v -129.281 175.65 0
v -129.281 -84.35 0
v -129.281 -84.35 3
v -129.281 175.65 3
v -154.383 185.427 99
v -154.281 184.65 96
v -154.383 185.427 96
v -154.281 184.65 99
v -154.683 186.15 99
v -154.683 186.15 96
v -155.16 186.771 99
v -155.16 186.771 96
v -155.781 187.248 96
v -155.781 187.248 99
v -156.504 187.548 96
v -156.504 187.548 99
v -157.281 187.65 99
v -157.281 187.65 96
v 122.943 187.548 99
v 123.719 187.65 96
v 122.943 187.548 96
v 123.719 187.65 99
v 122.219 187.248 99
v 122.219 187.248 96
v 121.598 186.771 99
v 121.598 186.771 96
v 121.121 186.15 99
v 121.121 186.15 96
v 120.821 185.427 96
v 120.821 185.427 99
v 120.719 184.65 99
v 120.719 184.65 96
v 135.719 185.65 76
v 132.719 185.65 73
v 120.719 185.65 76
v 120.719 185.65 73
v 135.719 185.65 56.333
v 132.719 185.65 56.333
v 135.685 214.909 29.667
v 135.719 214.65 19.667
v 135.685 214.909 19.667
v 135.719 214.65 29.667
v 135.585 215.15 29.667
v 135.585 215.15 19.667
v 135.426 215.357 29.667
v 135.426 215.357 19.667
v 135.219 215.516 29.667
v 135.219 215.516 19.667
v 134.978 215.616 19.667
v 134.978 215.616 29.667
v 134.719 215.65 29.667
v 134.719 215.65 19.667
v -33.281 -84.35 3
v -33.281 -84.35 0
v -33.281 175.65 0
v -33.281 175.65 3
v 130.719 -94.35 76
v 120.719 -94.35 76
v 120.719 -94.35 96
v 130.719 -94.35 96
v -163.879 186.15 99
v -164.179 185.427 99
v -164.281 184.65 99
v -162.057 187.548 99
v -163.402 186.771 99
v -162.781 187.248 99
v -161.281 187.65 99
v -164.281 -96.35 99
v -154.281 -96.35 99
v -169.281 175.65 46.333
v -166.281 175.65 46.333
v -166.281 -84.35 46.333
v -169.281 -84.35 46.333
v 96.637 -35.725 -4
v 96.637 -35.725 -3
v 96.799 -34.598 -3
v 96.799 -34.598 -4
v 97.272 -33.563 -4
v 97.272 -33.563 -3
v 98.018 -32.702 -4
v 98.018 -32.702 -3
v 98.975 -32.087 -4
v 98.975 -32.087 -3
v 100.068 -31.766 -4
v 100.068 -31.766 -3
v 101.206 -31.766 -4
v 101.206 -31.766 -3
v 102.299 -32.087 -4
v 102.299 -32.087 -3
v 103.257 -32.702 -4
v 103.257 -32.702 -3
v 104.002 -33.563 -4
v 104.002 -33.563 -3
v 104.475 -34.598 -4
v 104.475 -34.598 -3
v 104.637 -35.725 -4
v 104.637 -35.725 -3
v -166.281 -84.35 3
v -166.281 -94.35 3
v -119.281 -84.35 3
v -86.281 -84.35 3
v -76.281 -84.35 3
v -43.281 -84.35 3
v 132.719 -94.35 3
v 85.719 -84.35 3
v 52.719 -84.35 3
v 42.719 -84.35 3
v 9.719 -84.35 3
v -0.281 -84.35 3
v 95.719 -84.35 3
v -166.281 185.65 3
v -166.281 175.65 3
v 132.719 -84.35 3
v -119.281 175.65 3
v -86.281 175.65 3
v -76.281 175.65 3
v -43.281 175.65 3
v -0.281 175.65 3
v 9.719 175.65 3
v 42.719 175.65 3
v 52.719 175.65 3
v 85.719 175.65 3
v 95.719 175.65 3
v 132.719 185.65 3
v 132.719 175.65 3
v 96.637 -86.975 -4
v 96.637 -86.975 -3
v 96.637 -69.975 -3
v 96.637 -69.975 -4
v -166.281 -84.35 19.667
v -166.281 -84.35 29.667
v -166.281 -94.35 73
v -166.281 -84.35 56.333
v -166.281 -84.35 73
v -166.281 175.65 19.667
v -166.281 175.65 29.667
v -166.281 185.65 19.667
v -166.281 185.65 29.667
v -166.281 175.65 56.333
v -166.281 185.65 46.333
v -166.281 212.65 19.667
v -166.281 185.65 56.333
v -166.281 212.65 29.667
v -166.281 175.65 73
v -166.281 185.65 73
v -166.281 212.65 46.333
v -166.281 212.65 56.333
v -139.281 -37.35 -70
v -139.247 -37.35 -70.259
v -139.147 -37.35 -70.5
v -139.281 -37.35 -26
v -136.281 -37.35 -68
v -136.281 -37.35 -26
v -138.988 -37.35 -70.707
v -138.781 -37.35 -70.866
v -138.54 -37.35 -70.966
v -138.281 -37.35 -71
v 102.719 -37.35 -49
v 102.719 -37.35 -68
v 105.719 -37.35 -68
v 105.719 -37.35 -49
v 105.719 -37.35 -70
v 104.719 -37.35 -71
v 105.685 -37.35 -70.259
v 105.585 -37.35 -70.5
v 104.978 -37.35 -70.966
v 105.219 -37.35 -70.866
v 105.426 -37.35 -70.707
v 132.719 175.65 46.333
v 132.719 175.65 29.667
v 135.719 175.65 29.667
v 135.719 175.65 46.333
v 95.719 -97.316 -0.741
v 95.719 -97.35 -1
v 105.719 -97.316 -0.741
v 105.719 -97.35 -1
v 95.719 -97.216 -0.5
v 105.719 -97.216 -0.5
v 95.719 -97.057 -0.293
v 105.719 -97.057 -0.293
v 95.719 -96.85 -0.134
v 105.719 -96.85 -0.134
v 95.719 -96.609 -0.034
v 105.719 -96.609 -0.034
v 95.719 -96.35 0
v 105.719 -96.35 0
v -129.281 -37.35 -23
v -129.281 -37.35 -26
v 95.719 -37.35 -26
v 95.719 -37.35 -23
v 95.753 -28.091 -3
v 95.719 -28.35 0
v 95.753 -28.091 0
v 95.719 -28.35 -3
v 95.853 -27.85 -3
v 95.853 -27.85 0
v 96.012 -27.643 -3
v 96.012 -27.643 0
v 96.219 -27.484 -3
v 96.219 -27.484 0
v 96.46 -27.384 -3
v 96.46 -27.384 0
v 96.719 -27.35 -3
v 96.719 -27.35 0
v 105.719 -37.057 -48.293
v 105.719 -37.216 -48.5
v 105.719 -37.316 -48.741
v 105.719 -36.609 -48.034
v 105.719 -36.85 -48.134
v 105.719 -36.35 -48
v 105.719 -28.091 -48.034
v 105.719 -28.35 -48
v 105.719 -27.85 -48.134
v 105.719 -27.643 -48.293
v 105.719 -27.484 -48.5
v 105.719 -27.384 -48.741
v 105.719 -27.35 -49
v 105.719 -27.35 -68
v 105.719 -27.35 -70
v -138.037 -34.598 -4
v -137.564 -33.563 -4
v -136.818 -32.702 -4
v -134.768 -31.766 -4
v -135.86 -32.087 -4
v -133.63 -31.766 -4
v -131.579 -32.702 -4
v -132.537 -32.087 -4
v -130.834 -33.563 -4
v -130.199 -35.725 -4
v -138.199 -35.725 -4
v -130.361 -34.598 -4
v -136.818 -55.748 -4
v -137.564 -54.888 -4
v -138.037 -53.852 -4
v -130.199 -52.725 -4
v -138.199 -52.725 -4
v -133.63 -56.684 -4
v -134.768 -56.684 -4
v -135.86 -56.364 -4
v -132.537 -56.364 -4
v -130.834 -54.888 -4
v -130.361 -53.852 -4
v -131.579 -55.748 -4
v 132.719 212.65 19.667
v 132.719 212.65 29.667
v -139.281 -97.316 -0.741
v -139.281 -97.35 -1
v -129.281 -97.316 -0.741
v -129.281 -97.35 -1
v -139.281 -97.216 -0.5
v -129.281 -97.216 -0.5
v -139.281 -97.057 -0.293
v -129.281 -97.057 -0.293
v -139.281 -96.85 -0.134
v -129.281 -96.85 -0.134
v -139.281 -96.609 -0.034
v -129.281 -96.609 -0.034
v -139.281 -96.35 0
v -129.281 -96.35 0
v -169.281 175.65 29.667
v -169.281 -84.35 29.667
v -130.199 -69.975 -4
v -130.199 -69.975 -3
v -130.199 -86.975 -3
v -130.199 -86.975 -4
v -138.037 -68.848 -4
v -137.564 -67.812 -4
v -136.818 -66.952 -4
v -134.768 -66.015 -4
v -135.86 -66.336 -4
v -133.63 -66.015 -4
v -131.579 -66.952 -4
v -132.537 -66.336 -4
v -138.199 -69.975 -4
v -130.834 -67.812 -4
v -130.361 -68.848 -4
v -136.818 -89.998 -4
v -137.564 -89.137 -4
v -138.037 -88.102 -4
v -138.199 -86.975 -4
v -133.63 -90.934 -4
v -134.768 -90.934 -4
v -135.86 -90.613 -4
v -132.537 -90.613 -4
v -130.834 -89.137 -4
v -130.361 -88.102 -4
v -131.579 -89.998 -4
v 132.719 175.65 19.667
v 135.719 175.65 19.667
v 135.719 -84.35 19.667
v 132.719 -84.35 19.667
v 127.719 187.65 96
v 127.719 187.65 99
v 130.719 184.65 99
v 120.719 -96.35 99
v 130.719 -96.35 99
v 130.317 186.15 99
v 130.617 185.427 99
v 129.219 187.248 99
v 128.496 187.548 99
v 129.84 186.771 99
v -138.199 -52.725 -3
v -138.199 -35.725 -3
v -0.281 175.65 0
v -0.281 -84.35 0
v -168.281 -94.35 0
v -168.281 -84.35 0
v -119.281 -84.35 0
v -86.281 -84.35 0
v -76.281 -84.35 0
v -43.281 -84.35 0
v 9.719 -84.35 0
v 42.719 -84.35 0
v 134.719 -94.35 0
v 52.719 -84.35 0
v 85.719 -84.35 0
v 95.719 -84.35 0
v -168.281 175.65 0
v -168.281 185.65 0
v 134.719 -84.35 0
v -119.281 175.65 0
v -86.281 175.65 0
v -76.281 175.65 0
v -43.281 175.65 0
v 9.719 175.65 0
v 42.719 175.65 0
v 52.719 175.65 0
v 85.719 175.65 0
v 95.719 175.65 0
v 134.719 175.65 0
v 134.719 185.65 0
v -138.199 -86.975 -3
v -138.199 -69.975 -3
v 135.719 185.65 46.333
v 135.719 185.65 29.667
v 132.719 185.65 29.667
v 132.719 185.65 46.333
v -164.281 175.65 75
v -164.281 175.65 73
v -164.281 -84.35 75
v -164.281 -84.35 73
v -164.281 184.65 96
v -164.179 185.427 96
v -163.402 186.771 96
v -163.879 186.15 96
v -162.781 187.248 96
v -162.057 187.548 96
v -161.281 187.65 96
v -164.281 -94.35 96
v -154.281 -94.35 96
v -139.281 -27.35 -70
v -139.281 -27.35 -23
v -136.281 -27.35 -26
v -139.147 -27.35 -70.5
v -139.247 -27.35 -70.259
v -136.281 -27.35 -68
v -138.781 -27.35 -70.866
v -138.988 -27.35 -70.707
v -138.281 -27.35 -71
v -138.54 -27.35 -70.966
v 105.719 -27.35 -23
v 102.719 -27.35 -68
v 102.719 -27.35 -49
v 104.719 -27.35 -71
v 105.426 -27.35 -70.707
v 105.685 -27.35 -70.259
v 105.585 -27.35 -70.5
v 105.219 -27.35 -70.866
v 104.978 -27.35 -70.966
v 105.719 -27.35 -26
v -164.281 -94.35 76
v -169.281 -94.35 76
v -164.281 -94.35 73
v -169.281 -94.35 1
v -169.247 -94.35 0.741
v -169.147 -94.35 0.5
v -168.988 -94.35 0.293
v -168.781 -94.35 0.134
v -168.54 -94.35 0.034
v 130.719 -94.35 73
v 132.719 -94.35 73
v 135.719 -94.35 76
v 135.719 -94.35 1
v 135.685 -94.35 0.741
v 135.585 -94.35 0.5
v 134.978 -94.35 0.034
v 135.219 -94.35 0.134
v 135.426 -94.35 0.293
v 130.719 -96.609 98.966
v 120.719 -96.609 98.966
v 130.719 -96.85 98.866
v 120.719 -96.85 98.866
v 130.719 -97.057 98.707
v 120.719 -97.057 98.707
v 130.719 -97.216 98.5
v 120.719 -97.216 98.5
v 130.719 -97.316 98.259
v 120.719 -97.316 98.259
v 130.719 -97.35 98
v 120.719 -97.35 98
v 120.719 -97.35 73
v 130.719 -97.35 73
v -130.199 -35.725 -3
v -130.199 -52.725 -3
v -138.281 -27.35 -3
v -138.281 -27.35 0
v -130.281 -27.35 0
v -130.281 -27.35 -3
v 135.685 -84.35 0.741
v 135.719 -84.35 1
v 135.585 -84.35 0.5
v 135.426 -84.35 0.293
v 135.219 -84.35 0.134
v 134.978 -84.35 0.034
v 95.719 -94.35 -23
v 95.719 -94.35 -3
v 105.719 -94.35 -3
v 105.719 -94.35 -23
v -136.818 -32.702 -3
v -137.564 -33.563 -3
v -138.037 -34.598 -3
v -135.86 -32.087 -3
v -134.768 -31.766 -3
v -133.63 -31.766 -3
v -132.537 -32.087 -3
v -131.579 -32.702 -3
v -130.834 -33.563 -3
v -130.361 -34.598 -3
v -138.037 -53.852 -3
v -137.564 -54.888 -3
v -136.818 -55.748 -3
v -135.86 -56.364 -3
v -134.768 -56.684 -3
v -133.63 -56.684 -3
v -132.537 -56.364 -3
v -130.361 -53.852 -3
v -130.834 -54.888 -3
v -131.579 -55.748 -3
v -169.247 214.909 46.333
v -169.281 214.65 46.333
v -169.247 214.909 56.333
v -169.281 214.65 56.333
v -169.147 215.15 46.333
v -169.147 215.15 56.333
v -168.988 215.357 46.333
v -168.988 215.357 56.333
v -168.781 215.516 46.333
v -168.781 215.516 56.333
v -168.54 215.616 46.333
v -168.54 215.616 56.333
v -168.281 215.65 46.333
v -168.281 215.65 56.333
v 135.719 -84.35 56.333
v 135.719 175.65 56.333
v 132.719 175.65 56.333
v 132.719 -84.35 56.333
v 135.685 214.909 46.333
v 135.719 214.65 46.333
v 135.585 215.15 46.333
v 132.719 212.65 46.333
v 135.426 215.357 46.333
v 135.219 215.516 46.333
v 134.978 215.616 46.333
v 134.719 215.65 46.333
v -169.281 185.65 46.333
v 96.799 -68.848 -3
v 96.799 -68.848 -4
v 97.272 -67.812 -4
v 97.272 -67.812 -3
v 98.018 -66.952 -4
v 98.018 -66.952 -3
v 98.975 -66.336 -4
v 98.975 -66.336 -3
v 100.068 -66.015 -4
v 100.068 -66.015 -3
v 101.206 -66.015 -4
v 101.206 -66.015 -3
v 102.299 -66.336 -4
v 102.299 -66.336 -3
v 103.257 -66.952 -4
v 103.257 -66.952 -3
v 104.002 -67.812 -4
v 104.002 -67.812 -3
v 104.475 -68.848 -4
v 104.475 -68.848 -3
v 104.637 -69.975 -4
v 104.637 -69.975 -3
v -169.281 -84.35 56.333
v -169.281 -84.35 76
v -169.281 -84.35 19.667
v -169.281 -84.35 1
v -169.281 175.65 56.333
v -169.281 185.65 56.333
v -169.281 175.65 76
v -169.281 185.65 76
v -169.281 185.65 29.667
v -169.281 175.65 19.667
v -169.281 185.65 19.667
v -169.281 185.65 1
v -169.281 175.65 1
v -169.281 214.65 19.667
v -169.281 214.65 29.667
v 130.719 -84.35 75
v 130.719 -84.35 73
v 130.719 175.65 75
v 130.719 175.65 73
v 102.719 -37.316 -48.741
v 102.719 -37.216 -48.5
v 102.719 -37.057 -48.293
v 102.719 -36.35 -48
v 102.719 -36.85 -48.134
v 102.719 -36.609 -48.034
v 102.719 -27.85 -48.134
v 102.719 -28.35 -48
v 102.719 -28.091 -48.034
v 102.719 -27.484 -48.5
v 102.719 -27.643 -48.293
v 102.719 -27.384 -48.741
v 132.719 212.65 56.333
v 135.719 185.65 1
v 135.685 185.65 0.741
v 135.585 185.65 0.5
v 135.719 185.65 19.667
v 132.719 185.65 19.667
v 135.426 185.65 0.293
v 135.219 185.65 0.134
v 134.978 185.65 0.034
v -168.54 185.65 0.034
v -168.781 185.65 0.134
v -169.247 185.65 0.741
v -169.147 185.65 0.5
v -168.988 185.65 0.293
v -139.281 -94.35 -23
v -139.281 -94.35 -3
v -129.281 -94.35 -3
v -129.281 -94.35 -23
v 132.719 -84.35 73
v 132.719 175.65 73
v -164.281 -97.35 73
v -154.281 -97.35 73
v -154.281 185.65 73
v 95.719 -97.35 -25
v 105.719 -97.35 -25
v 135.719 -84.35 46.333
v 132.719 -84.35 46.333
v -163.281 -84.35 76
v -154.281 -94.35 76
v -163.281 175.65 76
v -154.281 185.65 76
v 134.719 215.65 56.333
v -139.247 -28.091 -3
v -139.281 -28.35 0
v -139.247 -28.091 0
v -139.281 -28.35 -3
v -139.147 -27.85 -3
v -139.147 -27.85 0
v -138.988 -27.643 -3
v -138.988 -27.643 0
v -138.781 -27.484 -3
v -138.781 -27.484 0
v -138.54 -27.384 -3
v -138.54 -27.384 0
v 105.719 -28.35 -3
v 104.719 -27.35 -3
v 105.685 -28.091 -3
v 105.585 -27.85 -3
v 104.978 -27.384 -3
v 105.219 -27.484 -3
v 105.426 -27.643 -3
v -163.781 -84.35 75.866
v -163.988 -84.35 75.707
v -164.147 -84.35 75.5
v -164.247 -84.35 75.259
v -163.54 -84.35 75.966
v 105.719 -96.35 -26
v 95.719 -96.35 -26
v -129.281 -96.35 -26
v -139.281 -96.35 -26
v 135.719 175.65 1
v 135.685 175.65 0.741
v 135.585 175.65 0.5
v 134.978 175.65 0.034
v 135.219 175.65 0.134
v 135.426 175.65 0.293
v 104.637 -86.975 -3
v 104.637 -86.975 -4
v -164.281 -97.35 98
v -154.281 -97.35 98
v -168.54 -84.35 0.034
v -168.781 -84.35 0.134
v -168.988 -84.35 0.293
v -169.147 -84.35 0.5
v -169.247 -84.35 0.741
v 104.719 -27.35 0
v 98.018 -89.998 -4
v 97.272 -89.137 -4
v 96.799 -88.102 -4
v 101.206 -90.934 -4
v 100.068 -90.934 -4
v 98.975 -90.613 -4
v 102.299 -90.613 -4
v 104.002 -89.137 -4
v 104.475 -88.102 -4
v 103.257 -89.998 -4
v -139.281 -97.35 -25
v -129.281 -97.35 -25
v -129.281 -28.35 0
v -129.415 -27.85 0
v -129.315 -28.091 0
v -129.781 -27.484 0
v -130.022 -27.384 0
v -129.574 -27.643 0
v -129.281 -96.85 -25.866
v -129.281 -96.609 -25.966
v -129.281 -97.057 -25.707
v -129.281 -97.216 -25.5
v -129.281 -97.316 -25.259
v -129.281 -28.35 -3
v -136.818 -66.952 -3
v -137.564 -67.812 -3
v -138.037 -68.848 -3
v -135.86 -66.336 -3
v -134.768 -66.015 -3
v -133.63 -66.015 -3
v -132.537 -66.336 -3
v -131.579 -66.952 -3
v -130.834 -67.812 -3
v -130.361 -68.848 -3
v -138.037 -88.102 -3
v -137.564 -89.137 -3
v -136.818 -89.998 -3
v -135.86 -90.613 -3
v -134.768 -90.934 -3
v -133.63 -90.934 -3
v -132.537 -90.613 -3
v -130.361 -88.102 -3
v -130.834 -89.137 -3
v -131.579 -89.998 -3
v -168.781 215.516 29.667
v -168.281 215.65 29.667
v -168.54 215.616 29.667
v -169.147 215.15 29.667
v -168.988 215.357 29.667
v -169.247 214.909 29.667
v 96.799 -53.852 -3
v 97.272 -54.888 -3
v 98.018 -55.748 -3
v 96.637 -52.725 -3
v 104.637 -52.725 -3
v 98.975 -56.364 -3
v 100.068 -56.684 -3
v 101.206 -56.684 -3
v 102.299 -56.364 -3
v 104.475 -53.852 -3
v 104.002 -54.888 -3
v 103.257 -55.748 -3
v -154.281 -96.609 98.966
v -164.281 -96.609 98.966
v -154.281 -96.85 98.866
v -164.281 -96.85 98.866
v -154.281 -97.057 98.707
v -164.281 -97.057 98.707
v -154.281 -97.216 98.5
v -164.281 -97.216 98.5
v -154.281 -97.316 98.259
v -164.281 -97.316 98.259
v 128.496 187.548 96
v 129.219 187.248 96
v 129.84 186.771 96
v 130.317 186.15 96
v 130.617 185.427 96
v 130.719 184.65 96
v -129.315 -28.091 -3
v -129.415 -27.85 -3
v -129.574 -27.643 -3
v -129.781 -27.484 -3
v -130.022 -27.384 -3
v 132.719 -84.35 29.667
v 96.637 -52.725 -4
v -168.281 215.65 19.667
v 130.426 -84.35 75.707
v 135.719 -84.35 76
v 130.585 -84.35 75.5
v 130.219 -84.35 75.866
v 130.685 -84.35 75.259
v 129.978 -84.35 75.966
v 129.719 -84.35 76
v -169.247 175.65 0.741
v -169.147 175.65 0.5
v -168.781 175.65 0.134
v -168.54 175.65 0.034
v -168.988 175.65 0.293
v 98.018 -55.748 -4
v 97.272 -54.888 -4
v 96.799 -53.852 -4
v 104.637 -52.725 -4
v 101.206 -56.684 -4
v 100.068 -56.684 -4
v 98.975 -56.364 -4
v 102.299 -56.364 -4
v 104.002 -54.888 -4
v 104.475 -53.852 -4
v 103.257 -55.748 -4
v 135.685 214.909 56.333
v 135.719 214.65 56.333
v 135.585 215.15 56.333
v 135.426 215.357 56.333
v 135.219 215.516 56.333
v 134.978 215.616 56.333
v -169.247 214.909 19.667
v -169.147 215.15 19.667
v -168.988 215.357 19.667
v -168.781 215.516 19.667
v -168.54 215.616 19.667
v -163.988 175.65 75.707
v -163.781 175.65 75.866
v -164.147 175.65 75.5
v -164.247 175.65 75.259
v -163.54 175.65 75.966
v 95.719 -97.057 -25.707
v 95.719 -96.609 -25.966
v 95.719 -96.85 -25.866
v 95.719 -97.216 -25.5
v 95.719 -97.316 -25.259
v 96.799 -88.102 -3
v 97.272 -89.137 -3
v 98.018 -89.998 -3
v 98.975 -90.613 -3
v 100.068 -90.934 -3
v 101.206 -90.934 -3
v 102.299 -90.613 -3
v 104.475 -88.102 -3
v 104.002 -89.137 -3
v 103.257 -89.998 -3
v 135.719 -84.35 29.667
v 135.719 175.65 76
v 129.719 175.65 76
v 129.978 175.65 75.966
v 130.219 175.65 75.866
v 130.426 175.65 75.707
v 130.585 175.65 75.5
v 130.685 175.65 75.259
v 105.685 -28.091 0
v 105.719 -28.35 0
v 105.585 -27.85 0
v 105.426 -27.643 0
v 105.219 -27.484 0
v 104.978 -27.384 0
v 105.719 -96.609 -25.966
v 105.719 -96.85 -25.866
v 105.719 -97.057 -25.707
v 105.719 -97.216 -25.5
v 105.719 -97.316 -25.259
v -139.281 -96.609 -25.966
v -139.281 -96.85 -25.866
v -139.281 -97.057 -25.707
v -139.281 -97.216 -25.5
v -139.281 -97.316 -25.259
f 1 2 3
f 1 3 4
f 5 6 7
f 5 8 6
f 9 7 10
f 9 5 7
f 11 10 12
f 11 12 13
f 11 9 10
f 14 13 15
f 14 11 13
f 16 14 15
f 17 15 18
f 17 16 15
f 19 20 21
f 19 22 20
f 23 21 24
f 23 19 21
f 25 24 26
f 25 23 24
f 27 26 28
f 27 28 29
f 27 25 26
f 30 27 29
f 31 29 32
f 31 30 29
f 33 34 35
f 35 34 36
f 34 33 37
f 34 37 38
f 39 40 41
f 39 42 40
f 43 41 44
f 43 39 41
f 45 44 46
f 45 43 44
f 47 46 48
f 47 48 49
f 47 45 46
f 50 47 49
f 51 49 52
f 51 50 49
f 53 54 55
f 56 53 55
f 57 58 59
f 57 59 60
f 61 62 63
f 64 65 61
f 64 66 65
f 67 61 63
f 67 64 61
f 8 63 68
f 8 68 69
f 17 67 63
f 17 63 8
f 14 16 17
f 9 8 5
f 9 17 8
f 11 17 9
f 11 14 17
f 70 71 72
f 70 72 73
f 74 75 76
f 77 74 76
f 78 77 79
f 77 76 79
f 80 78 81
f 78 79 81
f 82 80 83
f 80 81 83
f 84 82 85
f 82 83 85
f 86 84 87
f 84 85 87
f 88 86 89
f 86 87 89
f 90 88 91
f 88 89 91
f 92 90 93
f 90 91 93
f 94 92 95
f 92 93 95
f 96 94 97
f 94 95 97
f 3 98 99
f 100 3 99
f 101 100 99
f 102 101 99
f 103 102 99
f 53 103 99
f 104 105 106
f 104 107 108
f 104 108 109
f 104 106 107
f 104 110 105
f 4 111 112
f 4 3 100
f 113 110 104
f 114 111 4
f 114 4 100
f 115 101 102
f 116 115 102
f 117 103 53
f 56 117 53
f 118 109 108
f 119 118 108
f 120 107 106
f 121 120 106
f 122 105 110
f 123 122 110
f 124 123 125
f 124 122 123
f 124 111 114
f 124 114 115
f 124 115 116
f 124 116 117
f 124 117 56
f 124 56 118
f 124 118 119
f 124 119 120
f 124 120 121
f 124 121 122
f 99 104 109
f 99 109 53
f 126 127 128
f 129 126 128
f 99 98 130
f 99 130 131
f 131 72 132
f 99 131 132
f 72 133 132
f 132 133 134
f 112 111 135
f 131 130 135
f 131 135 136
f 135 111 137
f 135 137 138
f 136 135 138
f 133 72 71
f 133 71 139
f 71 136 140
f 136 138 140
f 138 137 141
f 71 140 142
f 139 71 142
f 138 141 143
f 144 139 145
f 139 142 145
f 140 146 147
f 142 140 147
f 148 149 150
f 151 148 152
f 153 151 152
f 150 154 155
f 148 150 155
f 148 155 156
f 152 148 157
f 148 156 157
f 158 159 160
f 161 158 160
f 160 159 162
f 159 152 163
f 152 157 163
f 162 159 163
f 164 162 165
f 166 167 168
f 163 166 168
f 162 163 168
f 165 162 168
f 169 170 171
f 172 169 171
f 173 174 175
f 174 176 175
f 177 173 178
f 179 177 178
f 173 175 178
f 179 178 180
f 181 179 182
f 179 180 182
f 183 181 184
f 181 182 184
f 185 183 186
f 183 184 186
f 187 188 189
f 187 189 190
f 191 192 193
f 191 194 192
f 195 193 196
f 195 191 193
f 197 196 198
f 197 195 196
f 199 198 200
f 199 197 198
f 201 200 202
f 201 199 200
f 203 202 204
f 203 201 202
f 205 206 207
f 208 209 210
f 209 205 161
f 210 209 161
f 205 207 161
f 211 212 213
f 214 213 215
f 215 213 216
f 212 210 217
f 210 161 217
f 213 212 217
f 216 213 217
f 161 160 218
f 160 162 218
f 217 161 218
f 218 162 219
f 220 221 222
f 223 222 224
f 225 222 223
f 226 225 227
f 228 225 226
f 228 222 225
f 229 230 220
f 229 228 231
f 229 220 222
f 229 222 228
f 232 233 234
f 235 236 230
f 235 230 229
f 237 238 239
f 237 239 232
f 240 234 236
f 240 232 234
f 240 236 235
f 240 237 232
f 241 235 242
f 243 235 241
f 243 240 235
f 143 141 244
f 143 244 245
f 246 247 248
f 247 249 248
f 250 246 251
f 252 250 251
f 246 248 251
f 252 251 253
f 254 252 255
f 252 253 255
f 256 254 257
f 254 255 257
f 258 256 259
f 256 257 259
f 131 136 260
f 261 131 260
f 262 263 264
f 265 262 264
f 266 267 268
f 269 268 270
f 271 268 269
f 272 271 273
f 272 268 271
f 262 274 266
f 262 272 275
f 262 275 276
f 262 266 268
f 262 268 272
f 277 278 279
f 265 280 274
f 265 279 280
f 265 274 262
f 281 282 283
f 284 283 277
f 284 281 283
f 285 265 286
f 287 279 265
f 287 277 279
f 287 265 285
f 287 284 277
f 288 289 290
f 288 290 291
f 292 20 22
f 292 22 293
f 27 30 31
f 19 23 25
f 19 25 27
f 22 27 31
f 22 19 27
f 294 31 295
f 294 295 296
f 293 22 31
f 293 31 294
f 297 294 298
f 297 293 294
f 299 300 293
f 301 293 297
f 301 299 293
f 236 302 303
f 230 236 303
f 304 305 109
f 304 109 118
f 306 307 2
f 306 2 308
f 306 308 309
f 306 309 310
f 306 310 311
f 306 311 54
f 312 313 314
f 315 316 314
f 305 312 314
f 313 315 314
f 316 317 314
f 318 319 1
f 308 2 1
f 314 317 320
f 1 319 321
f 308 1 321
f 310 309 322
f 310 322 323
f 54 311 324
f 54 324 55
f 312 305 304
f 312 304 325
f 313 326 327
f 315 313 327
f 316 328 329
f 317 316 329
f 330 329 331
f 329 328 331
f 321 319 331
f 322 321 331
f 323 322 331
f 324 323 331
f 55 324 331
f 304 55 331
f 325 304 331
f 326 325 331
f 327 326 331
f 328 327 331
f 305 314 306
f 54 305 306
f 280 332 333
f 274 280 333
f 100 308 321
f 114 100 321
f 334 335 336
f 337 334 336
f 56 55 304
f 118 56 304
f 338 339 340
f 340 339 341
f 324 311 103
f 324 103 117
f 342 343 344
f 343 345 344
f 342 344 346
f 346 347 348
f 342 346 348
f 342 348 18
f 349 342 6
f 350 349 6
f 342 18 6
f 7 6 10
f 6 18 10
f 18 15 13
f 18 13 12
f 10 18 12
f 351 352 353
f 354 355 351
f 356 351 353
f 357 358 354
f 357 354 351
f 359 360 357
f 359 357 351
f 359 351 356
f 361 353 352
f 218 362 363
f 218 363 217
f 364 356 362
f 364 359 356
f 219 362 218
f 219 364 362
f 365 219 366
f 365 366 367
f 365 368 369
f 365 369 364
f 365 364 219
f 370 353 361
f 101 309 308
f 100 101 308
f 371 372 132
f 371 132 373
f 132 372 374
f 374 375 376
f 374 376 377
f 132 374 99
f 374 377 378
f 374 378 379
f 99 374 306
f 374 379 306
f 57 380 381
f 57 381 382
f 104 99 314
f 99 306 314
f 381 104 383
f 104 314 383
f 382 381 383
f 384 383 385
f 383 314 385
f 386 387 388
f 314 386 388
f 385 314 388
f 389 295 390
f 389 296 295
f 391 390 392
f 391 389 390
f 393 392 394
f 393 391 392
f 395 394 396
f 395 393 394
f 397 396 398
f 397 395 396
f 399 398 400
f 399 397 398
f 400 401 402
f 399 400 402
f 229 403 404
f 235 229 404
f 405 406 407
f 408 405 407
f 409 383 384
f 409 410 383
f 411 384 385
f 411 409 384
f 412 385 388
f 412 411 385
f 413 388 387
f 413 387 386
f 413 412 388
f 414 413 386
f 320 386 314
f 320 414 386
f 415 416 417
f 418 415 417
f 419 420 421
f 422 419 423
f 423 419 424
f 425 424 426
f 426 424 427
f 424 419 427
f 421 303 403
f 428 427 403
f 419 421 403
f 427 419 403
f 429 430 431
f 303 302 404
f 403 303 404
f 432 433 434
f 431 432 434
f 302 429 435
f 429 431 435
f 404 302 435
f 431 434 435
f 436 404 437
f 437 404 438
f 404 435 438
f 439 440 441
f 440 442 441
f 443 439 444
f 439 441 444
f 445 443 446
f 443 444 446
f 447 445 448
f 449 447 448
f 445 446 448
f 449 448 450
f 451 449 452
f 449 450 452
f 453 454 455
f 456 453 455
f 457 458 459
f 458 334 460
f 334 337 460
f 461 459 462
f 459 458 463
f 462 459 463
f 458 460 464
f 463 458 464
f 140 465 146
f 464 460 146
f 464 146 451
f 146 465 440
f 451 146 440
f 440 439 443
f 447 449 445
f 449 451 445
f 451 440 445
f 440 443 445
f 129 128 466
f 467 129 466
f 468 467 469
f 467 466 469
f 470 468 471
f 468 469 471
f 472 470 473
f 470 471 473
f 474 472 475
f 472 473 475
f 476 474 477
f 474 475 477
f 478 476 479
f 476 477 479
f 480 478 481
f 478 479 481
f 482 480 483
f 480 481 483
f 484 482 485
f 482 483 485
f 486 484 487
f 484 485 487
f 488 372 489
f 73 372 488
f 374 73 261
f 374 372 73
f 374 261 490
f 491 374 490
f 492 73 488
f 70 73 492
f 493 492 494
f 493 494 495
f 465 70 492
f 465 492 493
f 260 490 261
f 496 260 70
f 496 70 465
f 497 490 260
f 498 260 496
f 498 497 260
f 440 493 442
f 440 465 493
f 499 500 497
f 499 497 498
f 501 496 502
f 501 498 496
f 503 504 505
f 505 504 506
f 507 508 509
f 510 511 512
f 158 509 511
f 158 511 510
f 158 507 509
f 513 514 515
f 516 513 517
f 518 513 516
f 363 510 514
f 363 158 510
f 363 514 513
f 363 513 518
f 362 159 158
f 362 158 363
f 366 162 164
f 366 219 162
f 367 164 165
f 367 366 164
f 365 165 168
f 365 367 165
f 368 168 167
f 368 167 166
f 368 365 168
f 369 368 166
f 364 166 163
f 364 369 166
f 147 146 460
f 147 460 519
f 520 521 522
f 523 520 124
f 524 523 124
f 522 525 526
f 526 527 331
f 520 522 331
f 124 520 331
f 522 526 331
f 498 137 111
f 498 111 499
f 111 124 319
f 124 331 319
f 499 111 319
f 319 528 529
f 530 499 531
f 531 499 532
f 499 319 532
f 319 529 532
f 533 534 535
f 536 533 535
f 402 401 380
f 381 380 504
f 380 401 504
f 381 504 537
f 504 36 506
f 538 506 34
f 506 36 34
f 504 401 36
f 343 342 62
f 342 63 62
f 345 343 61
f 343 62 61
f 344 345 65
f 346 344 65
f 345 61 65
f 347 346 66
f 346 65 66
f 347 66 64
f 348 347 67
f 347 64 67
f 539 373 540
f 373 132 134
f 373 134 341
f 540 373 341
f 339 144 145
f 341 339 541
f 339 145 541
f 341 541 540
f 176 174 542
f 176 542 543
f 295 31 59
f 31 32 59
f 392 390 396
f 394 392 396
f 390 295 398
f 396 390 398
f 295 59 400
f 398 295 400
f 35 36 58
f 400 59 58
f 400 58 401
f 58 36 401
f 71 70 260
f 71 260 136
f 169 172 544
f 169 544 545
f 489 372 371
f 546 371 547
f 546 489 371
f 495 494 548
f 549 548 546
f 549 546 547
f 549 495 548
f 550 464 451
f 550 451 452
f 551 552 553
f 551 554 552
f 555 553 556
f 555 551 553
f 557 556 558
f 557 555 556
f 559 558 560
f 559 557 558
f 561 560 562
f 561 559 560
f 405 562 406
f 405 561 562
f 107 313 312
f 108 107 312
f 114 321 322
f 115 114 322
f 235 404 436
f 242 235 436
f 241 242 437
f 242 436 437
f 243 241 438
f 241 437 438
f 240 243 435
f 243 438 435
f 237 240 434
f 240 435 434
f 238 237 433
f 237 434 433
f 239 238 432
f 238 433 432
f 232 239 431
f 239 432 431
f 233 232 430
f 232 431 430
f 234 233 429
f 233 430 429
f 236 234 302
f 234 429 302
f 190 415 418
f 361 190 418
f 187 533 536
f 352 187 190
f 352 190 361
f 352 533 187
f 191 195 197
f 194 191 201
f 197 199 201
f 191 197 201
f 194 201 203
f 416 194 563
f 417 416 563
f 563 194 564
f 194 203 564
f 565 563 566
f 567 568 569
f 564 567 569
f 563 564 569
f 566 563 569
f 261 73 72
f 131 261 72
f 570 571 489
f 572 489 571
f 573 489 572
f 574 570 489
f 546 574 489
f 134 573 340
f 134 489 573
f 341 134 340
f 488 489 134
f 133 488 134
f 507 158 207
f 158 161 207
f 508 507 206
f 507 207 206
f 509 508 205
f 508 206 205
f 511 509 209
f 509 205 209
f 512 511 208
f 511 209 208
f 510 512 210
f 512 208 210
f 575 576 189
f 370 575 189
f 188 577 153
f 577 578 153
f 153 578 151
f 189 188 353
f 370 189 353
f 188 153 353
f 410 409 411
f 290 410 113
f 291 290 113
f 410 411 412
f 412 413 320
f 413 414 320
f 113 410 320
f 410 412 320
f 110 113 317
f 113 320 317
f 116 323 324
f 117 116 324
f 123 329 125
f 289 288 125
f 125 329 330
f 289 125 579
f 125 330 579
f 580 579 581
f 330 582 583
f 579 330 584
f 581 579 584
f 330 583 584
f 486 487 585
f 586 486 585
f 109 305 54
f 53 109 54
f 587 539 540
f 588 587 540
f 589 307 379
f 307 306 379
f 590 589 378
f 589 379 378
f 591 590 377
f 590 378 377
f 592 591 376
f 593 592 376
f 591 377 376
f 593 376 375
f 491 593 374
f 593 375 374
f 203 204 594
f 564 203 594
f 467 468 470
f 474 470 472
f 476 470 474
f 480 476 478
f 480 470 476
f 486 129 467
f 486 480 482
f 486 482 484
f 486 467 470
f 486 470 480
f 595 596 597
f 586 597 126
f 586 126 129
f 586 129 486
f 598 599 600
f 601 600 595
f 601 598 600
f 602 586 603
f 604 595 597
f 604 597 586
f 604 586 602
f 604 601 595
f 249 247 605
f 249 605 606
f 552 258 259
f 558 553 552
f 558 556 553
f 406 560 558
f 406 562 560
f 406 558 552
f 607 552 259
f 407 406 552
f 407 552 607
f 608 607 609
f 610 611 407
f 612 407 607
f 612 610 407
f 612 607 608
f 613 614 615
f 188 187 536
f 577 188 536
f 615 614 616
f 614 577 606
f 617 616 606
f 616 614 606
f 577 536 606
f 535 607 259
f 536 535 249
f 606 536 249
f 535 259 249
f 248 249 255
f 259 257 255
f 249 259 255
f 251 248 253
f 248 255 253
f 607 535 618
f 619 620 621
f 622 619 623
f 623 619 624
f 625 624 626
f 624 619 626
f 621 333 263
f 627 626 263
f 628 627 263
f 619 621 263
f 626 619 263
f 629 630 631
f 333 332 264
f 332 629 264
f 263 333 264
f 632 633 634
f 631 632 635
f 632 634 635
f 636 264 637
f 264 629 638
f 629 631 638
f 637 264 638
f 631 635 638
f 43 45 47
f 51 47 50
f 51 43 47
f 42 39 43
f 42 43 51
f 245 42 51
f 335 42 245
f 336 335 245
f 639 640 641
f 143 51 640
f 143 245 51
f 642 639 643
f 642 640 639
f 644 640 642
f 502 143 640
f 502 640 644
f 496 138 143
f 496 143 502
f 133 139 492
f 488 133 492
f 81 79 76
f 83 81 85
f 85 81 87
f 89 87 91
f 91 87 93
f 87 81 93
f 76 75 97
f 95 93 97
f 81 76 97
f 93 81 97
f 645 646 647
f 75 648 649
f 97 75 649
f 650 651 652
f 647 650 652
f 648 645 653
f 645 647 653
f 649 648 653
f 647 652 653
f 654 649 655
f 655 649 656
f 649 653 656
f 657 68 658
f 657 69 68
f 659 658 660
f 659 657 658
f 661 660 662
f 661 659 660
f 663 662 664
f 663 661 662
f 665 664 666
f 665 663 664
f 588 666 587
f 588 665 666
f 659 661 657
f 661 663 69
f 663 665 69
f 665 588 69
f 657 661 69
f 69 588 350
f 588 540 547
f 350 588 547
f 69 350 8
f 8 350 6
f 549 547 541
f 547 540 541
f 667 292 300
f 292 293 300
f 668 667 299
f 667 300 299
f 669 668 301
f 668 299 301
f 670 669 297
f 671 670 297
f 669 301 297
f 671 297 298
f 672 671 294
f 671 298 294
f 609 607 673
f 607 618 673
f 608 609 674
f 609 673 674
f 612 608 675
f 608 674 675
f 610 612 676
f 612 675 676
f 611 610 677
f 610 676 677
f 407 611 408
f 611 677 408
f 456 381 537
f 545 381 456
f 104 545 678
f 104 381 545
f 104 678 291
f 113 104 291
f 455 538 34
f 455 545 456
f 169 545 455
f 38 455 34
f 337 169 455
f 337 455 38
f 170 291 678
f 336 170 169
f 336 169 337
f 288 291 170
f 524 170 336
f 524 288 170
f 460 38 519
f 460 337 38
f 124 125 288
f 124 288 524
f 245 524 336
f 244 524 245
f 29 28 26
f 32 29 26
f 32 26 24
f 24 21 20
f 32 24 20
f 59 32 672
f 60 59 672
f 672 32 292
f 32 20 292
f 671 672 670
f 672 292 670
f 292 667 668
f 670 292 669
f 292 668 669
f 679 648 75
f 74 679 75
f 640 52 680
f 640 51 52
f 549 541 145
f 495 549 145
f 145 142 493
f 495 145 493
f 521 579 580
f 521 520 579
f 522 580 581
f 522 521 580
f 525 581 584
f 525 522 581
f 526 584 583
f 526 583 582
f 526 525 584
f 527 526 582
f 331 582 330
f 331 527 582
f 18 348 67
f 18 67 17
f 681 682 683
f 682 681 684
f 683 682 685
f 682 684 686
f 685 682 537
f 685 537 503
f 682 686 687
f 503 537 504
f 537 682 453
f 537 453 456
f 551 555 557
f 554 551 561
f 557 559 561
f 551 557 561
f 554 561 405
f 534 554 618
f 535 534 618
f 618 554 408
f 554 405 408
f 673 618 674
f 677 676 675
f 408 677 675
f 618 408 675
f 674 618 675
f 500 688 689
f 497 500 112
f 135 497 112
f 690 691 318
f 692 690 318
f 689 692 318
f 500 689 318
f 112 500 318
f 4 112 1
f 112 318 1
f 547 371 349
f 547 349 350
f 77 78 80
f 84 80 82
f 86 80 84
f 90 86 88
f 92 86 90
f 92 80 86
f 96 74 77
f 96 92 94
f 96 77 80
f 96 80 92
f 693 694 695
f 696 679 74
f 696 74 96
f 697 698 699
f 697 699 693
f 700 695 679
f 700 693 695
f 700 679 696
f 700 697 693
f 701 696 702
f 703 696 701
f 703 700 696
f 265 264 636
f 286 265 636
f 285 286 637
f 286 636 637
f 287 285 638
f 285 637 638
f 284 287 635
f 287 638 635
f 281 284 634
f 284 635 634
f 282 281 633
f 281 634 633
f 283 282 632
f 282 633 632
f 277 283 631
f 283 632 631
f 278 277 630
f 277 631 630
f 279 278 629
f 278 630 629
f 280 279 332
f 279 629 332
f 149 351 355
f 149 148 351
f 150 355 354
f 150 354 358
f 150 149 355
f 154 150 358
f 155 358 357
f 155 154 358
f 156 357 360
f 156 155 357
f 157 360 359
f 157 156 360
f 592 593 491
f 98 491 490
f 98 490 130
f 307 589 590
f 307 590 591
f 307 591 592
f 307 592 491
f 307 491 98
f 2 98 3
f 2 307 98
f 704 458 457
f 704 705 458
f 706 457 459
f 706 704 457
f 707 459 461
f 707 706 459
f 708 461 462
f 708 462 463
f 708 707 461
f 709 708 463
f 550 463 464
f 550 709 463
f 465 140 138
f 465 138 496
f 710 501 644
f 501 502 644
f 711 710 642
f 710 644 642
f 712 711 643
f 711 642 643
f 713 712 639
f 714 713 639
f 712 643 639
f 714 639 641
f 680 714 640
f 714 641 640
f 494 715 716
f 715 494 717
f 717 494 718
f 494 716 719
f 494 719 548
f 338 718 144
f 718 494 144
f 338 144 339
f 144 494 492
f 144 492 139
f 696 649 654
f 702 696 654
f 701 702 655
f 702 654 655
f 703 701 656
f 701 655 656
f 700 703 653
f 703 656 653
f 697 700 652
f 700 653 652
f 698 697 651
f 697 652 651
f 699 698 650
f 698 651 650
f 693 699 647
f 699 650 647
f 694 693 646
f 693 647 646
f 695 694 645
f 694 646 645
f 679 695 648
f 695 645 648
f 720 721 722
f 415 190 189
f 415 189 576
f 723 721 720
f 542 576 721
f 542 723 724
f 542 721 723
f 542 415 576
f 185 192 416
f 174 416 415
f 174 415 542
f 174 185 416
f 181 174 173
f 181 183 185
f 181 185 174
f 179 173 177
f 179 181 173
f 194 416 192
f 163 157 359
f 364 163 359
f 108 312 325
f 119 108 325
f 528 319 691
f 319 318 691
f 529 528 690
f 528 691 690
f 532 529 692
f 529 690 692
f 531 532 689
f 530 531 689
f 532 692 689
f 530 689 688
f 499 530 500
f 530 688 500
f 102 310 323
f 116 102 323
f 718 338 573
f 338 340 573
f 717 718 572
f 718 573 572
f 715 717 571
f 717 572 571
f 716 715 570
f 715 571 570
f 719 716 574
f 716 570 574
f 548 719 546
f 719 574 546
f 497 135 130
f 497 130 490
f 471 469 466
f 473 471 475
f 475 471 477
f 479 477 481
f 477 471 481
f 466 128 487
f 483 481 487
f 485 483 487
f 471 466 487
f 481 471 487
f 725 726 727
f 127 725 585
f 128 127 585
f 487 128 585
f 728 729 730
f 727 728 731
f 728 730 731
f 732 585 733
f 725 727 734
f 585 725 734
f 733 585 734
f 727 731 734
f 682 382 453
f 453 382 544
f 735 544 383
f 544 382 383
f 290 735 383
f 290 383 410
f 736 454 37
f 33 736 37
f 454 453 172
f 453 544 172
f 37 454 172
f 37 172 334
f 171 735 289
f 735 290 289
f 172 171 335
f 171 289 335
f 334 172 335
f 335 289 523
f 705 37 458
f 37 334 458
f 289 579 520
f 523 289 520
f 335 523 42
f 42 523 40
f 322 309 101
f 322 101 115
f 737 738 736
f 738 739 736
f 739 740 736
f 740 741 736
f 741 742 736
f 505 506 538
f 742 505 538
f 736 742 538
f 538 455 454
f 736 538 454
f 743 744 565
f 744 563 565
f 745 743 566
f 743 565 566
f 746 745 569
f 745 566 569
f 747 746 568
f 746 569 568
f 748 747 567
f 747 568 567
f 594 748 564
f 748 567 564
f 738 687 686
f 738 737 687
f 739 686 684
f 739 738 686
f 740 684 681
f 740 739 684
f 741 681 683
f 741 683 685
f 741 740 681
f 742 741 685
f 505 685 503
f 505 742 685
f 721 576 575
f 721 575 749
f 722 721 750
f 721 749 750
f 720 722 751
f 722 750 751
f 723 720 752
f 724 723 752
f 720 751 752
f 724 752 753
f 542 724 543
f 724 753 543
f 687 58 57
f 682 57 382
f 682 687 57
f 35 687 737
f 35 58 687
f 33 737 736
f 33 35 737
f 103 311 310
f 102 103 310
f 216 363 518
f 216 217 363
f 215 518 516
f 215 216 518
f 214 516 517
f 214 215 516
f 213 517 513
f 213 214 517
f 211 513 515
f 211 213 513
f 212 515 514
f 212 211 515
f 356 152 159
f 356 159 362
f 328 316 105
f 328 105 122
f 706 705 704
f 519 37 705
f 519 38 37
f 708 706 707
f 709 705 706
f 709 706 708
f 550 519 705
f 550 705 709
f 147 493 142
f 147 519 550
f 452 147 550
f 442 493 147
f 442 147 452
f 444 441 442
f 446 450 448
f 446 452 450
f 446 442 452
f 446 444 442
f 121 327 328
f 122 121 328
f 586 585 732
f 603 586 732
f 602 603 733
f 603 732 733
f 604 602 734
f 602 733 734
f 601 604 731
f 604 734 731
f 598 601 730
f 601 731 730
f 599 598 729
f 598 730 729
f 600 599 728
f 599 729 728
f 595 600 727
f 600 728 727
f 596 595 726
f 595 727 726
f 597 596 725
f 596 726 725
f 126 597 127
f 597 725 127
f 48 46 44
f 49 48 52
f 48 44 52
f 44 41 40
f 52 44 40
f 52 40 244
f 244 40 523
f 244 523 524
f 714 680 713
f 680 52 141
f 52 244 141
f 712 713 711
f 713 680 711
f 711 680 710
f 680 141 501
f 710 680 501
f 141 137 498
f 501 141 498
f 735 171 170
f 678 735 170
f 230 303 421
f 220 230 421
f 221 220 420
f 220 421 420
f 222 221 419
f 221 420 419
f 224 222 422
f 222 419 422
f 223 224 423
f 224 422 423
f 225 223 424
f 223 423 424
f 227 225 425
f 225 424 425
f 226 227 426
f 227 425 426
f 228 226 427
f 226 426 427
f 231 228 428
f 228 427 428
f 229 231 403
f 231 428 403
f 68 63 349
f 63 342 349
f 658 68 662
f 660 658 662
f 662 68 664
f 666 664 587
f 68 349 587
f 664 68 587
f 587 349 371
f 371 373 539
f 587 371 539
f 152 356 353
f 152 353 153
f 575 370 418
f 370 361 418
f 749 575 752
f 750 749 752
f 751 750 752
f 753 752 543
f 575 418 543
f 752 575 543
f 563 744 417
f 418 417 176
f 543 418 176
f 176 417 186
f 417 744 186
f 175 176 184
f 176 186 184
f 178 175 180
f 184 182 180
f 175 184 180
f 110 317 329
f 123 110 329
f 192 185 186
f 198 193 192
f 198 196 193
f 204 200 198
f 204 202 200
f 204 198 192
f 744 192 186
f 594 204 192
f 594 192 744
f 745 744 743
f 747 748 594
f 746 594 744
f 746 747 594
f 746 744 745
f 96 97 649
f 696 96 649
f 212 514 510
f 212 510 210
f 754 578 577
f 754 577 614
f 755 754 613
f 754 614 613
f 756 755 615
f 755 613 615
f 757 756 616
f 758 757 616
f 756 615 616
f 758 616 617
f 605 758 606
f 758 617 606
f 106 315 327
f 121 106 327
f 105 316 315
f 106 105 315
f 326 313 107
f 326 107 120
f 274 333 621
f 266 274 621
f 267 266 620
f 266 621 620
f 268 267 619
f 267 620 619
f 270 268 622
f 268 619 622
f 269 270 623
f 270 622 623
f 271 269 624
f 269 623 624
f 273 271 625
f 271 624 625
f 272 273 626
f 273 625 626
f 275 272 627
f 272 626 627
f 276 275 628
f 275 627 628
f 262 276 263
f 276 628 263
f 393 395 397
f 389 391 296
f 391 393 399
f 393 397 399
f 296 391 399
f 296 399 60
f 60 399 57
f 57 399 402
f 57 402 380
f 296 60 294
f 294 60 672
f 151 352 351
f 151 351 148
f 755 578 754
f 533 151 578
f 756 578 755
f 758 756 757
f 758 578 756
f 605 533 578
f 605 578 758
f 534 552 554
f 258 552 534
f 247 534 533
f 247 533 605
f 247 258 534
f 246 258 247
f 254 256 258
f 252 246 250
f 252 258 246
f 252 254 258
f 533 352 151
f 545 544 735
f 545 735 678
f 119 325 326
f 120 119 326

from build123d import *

# Parameters (mm, degrees)
F0_W           = 10
F0_H           = 260
F1_DEPTH       = 3
F2_W           = 3
F2_H           = 10
F3_DEPTH       = 70
F4_W           = 2
F4_H           = 10
F4_W_2         = 3
F4_W_3         = 10
F4_H_2         = 3
F4_W_4         = 5
F5_DEPTH       = 3
F6_W           = 10
F6_H           = 3
F7_DEPTH       = 20
F8_W           = 10
F8_H           = 282
F8_H_2         = 285
F8_H_3         = 3
F9_DEPTH       = 3
F10_W          = 3
F10_H          = 10
F11_DEPTH      = 30
F11_DEPTH_BACK = 270
F12_W          = 3
F12_H          = 10
F13_DEPTH      = 299
F14_R          = 1
F15_R          = 3
F16_W          = 10
F16_H          = 70
F17_DEPTH      = 3
F18_W          = 10
F18_H          = 3
F19_DEPTH      = 20
F20_W          = 10
F20_H          = 70
F21_DEPTH      = 3
F20_H_2        = 67
F20_H_3        = 3
F22_W          = 10
F22_H          = 3
F23_DEPTH      = 225
F24_W          = 3
F24_H          = 10
F25_DEPTH      = 45
F26_W          = 10
F26_H          = 3
F27_DEPTH      = 242
F28_W          = 3
F28_H          = 10
F29_DEPTH      = 20
F30_R          = 1
F32_DEPTH      = 1


with BuildPart() as f1:
    # F0 (on Top) → F1 (new body)
    with BuildSketch(Plane.XY):
        Polygon((135.7191348076, 185.6500792865), (-169.2808651924, 185.6500792865), (-169.2808651924, 175.6500792865), (-129.2808651924, 175.6500792865), (-119.2808651924, 175.6500792865), (-86.2808651924, 175.6500792865), (-76.2808651924, 175.6500792865), (-43.2808651924, 175.6500792865), (-33.2808651924, 175.6500792865), (-0.2808651924, 175.6500792865), (9.7191348076, 175.6500792865), (42.7191348076, 175.6500792865), (52.7191348076, 175.6500792865), (85.7191348076, 175.6500792865), (95.7191348076, 175.6500792865), (135.7191348076, 175.6500792865), align=None)
        with Locations((-124.2808651924, 45.6500792865)):
            Rectangle(F0_W, F0_H)
        with Locations((-81.2808651924, 45.6500792865)):
            Rectangle(F0_W, F0_H)
        with Locations((-38.2808651924, 45.6500792865)):
            Rectangle(F0_W, F0_H)
        with Locations((4.7191348076, 45.6500792865)):
            Rectangle(F0_W, F0_H)
        with Locations((47.7191348076, 45.6500792865)):
            Rectangle(F0_W, F0_H)
        with Locations((90.7191348076, 45.6500792865)):
            Rectangle(F0_W, F0_H)
        Polygon((-129.2808651924, -84.3499207135), (-169.2808651924, -84.3499207135), (-169.2808651924, -94.3499207135), (135.7191348076, -94.3499207135), (135.7191348076, -84.3499207135), (95.7191348076, -84.3499207135), (85.7191348076, -84.3499207135), (52.7191348076, -84.3499207135), (42.7191348076, -84.3499207135), (9.7191348076, -84.3499207135), (-0.2808651924, -84.3499207135), (-33.2808651924, -84.3499207135), (-43.2808651924, -84.3499207135), (-76.2808651924, -84.3499207135), (-86.2808651924, -84.3499207135), (-119.2808651924, -84.3499207135), align=None)
    extrude(amount=F1_DEPTH)

    # F2 (on face) → F3 (join)
    with BuildSketch(Plane.XY.offset(3)):
        with Locations((-167.7808651924, 180.6500792865)):
            Rectangle(F2_W, F2_H)
        with Locations((134.2191348076, 180.6500792865)):
            Rectangle(F2_W, F2_H)
        with Locations((134.2191348076, -89.3499207135)):
            Rectangle(F2_W, F2_H)
        with Locations((-167.7808651924, -89.3499207135)):
            Rectangle(F2_W, F2_H)
    extrude(amount=F3_DEPTH)

    # F4 (on face) → F5 (join)
    with BuildSketch(Plane.XY.offset(73)):
        Polygon((-154.2808651924, 185.6500792865), (-164.2808651924, 185.6500792865), (-164.2808651924, 175.6500792865), (-164.2808651924, -84.3499207135), (-164.2808651924, -94.3499207135), (-154.2808651924, -94.3499207135), align=None)
        with Locations((-165.2808651924, 180.6500792865)):
            Rectangle(F4_W, F4_H)
        with Locations((-167.7808651924, 180.6500792865)):
            Rectangle(F4_W_2, F4_H)
        with Locations((-159.2808651924, -95.8499207135)):
            Rectangle(F4_W_3, F4_H_2)
        with Locations((125.7191348076, -95.8499207135)):
            Rectangle(F4_W_3, F4_H_2)
        Polygon((130.7191348076, 185.6500792865), (120.7191348076, 185.6500792865), (120.7191348076, -94.3499207135), (130.7191348076, -94.3499207135), (130.7191348076, -84.3499207135), (130.7191348076, 175.6500792865), align=None)
        with Locations((133.2191348076, -89.3499207135)):
            Rectangle(F4_W_4, F4_H)
        with Locations((133.2191348076, 180.6500792865)):
            Rectangle(F4_W_4, F4_H)
        with Locations((-166.7808651924, -89.3499207135)):
            Rectangle(F4_W_4, F4_H)
    extrude(amount=F5_DEPTH)

    # F6 (on face) → F7 (join)
    with BuildSketch(Plane.XY.offset(76)):
        with Locations((-159.2808651924, -95.8499207135)):
            Rectangle(F6_W, F6_H)
        with Locations((125.7191348076, -95.8499207135)):
            Rectangle(F6_W, F6_H)
    extrude(amount=F7_DEPTH)

    # F8 (on face) → F9 (join)
    with BuildSketch(Plane.XY.offset(96)):
        with Locations((-159.2808651924, 46.6500792865)):
            Rectangle(F8_W, F8_H)
        with Locations((125.7191348076, 45.1500792865)):
            Rectangle(F8_W, F8_H_2)
        with Locations((-159.2808651924, -95.8499207135)):
            Rectangle(F8_W, F8_H_3)
    extrude(amount=F9_DEPTH)

    # F10 (on face) → F11 (join, two sides)
    with BuildSketch(Plane(origin=(0, 185.6500792865, 0), x_dir=(-1, 0, 0), z_dir=(0, 1, 0))) as f11_sk:
        with Locations((167.7808651924, 51.3333333333)):
            Rectangle(F10_W, F10_H)
        with Locations((167.7808651924, 24.6666666667)):
            Rectangle(F10_W, F10_H)
        with Locations((-134.2191348076, 51.3333333333)):
            Rectangle(F10_W, F10_H)
        with Locations((-134.2191348076, 24.6666666667)):
            Rectangle(F10_W, F10_H)
    extrude(amount=F11_DEPTH)
    extrude(f11_sk.sketch, amount=-F11_DEPTH_BACK)

    # F12 (on face) → F13 (join, through all)
    with BuildSketch(Plane.YZ.offset(-166.2808651924)):
        with Locations((214.1500792864, 51.3333333333)):
            Rectangle(F12_W, F12_H)
        with Locations((214.1500792864, 24.6666666667)):
            Rectangle(F12_W, F12_H)
    extrude(amount=F13_DEPTH)

    # F14
    f14_edges = [f1.edges().sort_by_distance(p)[0] for p in [
        (-169.280865, 180.650079, 0),
        (-169.280865, -89.349921, 0),
        (135.719135, -89.349921, 0),
        (135.719135, 180.650079, 0),
        (135.719135, 215.650079, 24.666667),
        (135.719135, 215.650079, 51.333333),
        (-169.280865, 215.650079, 51.333333),
        (-169.280865, 215.650079, 24.666667),
        (-164.280865, 45.650079, 76),
        (-159.280865, -97.349921, 99),
        (125.719135, -97.349921, 99),
        (130.719135, 45.650079, 76),
    ]]
    fillet(f14_edges, radius=F14_R)

    # F15
    f15_edges = [f1.edges().sort_by_distance(p)[0] for p in [
        (-154.280865, 187.650079, 97.5),
        (-164.280865, 187.650079, 97.5),
        (120.719135, 187.650079, 97.5),
        (130.719135, 187.650079, 97.5),
    ]]
    fillet(f15_edges, radius=F15_R)


with BuildPart() as f17:
    # F16 (on Top) → F17 (new body)
    with BuildSketch(Plane.XY):
        with Locations((-134.2808651924, -62.3499207135)):
            Rectangle(F16_W, F16_H)
    extrude(amount=-F17_DEPTH)

    # F18 (on face) → F19 (join)
    with BuildSketch(Plane(origin=(0, 0, -3), x_dir=(1, 0, 0), z_dir=(0, 0, -1))):
        with Locations((-134.2808651924, 95.8499207135)):
            Rectangle(F18_W, F18_H)
    extrude(amount=F19_DEPTH)

    # F20 (on face) → F21, piece 2 (join)
    with BuildSketch(Plane(origin=(0, 0, -23), x_dir=(1, 0, 0), z_dir=(0, 0, -1))):
        with Locations((-134.2808651924, 60.8499207135)):
            Rectangle(F20_W, F20_H_2)
        with Locations((-134.2808651924, 95.8499207135)):
            Rectangle(F20_W, F20_H_3)
    extrude(amount=F21_DEPTH)



with BuildPart() as f17b:
    # F16 (on Top) → F17, piece 2 (new body)
    with BuildSketch(Plane.XY):
        with Locations((100.7191348076, -62.3499207135)):
            Rectangle(F16_W, F16_H)
    extrude(amount=-F17_DEPTH)

    # F18 (on face) → F19, piece 2 (join)
    with BuildSketch(Plane(origin=(0, 0, -3), x_dir=(1, 0, 0), z_dir=(0, 0, -1))):
        with Locations((100.7191348076, 95.8499207135)):
            Rectangle(F18_W, F18_H)
    extrude(amount=F19_DEPTH)

    # F20 (on face) → F21 (join)
    with BuildSketch(Plane(origin=(0, 0, -23), x_dir=(1, 0, 0), z_dir=(0, 0, -1))):
        with Locations((100.7191348076, 62.3499207135)):
            Rectangle(F20_W, F20_H)
    extrude(amount=F21_DEPTH)


with BuildPart() as f17_1:
    add(f17.part)

    add(f17b.part)  # F23 merges F17b
    # F22 (on face) → F23 (join, through all)
    with BuildSketch(Plane.YZ.offset(-129.2808651924)):
        with Locations((-32.3499207135, -24.5)):
            Rectangle(F22_W, F22_H)
    extrude(amount=F23_DEPTH)

    # F24 (on face) → F25 (join)
    with BuildSketch(Plane(origin=(0, 0, -26), x_dir=(1, 0, 0), z_dir=(0, 0, -1))):
        with Locations((-137.7808651924, 32.3499207135)):
            Rectangle(F24_W, F24_H)
    extrude(amount=F25_DEPTH)

    # F26 (on face) → F27 (join, through all)
    with BuildSketch(Plane.YZ.offset(-136.2808651924)):
        with Locations((-32.3499207135, -69.5)):
            Rectangle(F26_W, F26_H)
    extrude(amount=F27_DEPTH)

    # F28 (on face) → F29 (join)
    with BuildSketch(Plane.XY.offset(-68)):
        with Locations((104.2191348077, -32.3499207135)):
            Rectangle(F28_W, F28_H)
    extrude(amount=F29_DEPTH)

    # F30
    f30_edges = [f17_1.edges().sort_by_distance(p)[0] for p in [
        (-129.280865, -27.349921, -1.5),
        (-139.280865, -27.349921, -1.5),
        (-134.280865, -97.349921, 0),
        (-134.280865, -97.349921, -26),
        (100.719135, -97.349921, 0),
        (100.719135, -97.349921, -26),
        (95.719135, -27.349921, -1.5),
        (105.719135, -27.349921, -1.5),
        (-139.280865, -32.349921, -71),
        (105.719135, -32.349921, -71),
        (104.219135, -37.349921, -48),
        (104.219135, -27.349921, -48),
    ]]
    fillet(f30_edges, radius=F30_R)


with BuildPart() as f32:
    # F31 (on face) → F32 (new body)
    with BuildSketch(Plane(origin=(0, 0, -3), x_dir=(1, 0, 0), z_dir=(0, 0, -1))):
        with BuildLine():
            ThreePointArc((-138.1987937689, 35.725209862), (-134.1987937689, 31.725209862), (-130.1987937689, 35.725209862))
            Line((-130.1987937689, 35.725209862), (-130.1987937689, 52.725209862))
            ThreePointArc((-130.1987937689, 52.725209862), (-134.1987937689, 56.725209862), (-138.1987937689, 52.725209862))
            Line((-138.1987937689, 52.725209862), (-138.1987937689, 35.725209862))
        make_face()
    extrude(amount=F32_DEPTH)


with BuildPart() as f32b:
    # F31 (on face) → F32, piece 2 (new body)
    with BuildSketch(Plane(origin=(0, 0, -3), x_dir=(1, 0, 0), z_dir=(0, 0, -1))):
        with BuildLine():
            ThreePointArc((104.6370633841, 52.725209862), (100.6370633841, 56.725209862), (96.6370633841, 52.725209862))
            Line((96.6370633841, 52.725209862), (96.6370633841, 35.725209862))
            ThreePointArc((96.6370633841, 35.725209862), (100.6370633841, 31.725209862), (104.6370633841, 35.725209862))
            Line((104.6370633841, 35.725209862), (104.6370633841, 52.725209862))
        make_face()
    extrude(amount=F32_DEPTH)


with BuildPart() as f32c:
    # F31 (on face) → F32, piece 3 (new body)
    with BuildSketch(Plane(origin=(0, 0, -3), x_dir=(1, 0, 0), z_dir=(0, 0, -1))):
        with BuildLine():
            ThreePointArc((104.6370633841, 86.9746315651), (100.6370633841, 90.9746315651), (96.6370633841, 86.9746315651))
            Line((96.6370633841, 86.9746315651), (96.6370633841, 69.9746315651))
            ThreePointArc((96.6370633841, 69.9746315651), (100.6370633841, 65.9746315651), (104.6370633841, 69.9746315651))
            Line((104.6370633841, 69.9746315651), (104.6370633841, 86.9746315651))
        make_face()
    extrude(amount=F32_DEPTH)


with BuildPart() as f32d:
    # F31 (on face) → F32, piece 4 (new body)
    with BuildSketch(Plane(origin=(0, 0, -3), x_dir=(1, 0, 0), z_dir=(0, 0, -1))):
        with BuildLine():
            Line((-138.1987937689, 86.9746315651), (-138.1987937689, 69.9746315651))
            ThreePointArc((-138.1987937689, 69.9746315651), (-134.1987937689, 65.9746315651), (-130.1987937689, 69.9746315651))
            Line((-130.1987937689, 69.9746315651), (-130.1987937689, 86.9746315651))
            ThreePointArc((-130.1987937689, 86.9746315651), (-134.1987937689, 90.9746315651), (-138.1987937689, 86.9746315651))
        make_face()
    extrude(amount=F32_DEPTH)


solid = Compound([f1.part, f17_1.part, f32.part, f32b.part, f32c.part, f32d.part])
